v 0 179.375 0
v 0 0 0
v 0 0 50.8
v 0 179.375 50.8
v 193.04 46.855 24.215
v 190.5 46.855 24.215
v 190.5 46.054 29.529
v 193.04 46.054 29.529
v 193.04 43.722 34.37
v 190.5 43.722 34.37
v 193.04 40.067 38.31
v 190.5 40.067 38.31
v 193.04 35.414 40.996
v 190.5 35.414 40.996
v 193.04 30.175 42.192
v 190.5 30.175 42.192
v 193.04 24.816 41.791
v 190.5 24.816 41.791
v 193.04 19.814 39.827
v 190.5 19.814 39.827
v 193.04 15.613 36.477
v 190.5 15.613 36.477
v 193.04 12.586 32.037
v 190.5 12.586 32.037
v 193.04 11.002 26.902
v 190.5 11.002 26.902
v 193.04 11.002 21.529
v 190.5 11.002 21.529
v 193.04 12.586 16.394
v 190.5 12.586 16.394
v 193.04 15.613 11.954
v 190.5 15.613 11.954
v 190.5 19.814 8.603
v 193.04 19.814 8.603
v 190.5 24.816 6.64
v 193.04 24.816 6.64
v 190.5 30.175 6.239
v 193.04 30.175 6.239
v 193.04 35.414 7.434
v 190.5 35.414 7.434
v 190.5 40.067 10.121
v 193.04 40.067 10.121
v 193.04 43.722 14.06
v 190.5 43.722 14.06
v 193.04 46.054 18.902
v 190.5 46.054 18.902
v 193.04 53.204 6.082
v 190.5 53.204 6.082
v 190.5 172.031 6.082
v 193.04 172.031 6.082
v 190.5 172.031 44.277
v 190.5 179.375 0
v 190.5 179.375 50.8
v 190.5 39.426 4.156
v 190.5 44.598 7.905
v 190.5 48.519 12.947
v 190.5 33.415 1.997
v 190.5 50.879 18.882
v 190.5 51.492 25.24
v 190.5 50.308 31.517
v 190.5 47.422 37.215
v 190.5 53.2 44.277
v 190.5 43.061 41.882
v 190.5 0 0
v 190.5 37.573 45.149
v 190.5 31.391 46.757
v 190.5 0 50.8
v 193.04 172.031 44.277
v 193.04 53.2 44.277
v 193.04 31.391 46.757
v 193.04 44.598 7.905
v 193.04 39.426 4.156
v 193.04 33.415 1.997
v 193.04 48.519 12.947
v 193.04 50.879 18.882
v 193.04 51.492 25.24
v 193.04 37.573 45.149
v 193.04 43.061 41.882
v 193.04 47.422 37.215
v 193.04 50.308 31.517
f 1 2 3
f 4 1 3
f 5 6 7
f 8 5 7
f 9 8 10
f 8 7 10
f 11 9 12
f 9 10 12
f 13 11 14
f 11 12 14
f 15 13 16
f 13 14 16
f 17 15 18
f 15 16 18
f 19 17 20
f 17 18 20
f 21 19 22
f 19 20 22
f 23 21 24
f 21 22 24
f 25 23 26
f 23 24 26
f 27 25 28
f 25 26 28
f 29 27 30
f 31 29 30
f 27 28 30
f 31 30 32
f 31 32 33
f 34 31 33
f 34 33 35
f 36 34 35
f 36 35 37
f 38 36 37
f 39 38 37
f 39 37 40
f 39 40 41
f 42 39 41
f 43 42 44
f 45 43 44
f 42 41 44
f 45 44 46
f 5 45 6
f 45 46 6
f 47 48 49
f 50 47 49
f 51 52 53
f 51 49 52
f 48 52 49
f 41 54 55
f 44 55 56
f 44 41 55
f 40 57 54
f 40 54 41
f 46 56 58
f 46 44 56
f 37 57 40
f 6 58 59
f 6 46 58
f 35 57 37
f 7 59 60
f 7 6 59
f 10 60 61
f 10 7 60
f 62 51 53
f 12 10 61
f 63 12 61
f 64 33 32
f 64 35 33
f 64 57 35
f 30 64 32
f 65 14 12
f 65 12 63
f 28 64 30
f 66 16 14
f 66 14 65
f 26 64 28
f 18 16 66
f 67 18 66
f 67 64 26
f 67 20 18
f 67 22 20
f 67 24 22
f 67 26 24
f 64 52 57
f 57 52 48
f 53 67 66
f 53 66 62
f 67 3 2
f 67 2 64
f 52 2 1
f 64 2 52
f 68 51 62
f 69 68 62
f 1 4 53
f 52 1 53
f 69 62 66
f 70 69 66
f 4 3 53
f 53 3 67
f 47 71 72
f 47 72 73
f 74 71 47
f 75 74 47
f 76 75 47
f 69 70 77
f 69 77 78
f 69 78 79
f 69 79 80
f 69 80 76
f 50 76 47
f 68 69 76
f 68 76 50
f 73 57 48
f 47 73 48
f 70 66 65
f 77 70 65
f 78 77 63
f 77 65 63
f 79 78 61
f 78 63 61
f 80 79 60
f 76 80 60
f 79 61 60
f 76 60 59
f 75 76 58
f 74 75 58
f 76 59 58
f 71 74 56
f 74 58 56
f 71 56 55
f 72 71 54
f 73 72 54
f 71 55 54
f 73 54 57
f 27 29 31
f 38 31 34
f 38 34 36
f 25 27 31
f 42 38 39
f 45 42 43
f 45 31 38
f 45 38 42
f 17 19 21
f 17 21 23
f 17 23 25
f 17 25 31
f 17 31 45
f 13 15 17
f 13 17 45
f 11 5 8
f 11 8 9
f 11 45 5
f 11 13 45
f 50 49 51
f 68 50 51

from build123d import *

# Parameters (mm, degrees)
F0_W     = 190.5
F0_H     = 50.8
F1_DEPTH = 179.3748
F2_R     = 18.027204
F3_DEPTH = 2.54
F5_DEPTH = 2.54


with BuildPart() as f1:
    # F0 (on Front) → F1 (new body)
    with BuildSketch(Plane.XZ):
        with Locations((95.25, 25.4)):
            Rectangle(F0_W, F0_H)
    extrude(amount=-F1_DEPTH)

    # F2 (on face) → F3 (join)
    with BuildSketch(Plane.YZ.offset(190.5)):
        with Locations((28.827632, 24.215335)):
            Circle(F2_R)
    extrude(amount=F3_DEPTH)

    # F4 (on face) → F5 (join)
    with BuildSketch(Plane.YZ.offset(190.5)):
        with BuildLine():
            ThreePointArc((31.39125, 46.757364), (51.491809, 25.24017), (33.41525, 1.996672))
            Line((33.41525, 1.996672), (53.203531, 6.082475))
            Line((53.203531, 6.082475), (172.030688, 6.082475))
            Line((172.030688, 6.082475), (172.030688, 44.277191))
            Line((172.030688, 44.277191), (53.199542, 44.277191))
            Line((53.199542, 44.277191), (31.39125, 46.757364))
        make_face()
    extrude(amount=F5_DEPTH)


solid = f1.part
